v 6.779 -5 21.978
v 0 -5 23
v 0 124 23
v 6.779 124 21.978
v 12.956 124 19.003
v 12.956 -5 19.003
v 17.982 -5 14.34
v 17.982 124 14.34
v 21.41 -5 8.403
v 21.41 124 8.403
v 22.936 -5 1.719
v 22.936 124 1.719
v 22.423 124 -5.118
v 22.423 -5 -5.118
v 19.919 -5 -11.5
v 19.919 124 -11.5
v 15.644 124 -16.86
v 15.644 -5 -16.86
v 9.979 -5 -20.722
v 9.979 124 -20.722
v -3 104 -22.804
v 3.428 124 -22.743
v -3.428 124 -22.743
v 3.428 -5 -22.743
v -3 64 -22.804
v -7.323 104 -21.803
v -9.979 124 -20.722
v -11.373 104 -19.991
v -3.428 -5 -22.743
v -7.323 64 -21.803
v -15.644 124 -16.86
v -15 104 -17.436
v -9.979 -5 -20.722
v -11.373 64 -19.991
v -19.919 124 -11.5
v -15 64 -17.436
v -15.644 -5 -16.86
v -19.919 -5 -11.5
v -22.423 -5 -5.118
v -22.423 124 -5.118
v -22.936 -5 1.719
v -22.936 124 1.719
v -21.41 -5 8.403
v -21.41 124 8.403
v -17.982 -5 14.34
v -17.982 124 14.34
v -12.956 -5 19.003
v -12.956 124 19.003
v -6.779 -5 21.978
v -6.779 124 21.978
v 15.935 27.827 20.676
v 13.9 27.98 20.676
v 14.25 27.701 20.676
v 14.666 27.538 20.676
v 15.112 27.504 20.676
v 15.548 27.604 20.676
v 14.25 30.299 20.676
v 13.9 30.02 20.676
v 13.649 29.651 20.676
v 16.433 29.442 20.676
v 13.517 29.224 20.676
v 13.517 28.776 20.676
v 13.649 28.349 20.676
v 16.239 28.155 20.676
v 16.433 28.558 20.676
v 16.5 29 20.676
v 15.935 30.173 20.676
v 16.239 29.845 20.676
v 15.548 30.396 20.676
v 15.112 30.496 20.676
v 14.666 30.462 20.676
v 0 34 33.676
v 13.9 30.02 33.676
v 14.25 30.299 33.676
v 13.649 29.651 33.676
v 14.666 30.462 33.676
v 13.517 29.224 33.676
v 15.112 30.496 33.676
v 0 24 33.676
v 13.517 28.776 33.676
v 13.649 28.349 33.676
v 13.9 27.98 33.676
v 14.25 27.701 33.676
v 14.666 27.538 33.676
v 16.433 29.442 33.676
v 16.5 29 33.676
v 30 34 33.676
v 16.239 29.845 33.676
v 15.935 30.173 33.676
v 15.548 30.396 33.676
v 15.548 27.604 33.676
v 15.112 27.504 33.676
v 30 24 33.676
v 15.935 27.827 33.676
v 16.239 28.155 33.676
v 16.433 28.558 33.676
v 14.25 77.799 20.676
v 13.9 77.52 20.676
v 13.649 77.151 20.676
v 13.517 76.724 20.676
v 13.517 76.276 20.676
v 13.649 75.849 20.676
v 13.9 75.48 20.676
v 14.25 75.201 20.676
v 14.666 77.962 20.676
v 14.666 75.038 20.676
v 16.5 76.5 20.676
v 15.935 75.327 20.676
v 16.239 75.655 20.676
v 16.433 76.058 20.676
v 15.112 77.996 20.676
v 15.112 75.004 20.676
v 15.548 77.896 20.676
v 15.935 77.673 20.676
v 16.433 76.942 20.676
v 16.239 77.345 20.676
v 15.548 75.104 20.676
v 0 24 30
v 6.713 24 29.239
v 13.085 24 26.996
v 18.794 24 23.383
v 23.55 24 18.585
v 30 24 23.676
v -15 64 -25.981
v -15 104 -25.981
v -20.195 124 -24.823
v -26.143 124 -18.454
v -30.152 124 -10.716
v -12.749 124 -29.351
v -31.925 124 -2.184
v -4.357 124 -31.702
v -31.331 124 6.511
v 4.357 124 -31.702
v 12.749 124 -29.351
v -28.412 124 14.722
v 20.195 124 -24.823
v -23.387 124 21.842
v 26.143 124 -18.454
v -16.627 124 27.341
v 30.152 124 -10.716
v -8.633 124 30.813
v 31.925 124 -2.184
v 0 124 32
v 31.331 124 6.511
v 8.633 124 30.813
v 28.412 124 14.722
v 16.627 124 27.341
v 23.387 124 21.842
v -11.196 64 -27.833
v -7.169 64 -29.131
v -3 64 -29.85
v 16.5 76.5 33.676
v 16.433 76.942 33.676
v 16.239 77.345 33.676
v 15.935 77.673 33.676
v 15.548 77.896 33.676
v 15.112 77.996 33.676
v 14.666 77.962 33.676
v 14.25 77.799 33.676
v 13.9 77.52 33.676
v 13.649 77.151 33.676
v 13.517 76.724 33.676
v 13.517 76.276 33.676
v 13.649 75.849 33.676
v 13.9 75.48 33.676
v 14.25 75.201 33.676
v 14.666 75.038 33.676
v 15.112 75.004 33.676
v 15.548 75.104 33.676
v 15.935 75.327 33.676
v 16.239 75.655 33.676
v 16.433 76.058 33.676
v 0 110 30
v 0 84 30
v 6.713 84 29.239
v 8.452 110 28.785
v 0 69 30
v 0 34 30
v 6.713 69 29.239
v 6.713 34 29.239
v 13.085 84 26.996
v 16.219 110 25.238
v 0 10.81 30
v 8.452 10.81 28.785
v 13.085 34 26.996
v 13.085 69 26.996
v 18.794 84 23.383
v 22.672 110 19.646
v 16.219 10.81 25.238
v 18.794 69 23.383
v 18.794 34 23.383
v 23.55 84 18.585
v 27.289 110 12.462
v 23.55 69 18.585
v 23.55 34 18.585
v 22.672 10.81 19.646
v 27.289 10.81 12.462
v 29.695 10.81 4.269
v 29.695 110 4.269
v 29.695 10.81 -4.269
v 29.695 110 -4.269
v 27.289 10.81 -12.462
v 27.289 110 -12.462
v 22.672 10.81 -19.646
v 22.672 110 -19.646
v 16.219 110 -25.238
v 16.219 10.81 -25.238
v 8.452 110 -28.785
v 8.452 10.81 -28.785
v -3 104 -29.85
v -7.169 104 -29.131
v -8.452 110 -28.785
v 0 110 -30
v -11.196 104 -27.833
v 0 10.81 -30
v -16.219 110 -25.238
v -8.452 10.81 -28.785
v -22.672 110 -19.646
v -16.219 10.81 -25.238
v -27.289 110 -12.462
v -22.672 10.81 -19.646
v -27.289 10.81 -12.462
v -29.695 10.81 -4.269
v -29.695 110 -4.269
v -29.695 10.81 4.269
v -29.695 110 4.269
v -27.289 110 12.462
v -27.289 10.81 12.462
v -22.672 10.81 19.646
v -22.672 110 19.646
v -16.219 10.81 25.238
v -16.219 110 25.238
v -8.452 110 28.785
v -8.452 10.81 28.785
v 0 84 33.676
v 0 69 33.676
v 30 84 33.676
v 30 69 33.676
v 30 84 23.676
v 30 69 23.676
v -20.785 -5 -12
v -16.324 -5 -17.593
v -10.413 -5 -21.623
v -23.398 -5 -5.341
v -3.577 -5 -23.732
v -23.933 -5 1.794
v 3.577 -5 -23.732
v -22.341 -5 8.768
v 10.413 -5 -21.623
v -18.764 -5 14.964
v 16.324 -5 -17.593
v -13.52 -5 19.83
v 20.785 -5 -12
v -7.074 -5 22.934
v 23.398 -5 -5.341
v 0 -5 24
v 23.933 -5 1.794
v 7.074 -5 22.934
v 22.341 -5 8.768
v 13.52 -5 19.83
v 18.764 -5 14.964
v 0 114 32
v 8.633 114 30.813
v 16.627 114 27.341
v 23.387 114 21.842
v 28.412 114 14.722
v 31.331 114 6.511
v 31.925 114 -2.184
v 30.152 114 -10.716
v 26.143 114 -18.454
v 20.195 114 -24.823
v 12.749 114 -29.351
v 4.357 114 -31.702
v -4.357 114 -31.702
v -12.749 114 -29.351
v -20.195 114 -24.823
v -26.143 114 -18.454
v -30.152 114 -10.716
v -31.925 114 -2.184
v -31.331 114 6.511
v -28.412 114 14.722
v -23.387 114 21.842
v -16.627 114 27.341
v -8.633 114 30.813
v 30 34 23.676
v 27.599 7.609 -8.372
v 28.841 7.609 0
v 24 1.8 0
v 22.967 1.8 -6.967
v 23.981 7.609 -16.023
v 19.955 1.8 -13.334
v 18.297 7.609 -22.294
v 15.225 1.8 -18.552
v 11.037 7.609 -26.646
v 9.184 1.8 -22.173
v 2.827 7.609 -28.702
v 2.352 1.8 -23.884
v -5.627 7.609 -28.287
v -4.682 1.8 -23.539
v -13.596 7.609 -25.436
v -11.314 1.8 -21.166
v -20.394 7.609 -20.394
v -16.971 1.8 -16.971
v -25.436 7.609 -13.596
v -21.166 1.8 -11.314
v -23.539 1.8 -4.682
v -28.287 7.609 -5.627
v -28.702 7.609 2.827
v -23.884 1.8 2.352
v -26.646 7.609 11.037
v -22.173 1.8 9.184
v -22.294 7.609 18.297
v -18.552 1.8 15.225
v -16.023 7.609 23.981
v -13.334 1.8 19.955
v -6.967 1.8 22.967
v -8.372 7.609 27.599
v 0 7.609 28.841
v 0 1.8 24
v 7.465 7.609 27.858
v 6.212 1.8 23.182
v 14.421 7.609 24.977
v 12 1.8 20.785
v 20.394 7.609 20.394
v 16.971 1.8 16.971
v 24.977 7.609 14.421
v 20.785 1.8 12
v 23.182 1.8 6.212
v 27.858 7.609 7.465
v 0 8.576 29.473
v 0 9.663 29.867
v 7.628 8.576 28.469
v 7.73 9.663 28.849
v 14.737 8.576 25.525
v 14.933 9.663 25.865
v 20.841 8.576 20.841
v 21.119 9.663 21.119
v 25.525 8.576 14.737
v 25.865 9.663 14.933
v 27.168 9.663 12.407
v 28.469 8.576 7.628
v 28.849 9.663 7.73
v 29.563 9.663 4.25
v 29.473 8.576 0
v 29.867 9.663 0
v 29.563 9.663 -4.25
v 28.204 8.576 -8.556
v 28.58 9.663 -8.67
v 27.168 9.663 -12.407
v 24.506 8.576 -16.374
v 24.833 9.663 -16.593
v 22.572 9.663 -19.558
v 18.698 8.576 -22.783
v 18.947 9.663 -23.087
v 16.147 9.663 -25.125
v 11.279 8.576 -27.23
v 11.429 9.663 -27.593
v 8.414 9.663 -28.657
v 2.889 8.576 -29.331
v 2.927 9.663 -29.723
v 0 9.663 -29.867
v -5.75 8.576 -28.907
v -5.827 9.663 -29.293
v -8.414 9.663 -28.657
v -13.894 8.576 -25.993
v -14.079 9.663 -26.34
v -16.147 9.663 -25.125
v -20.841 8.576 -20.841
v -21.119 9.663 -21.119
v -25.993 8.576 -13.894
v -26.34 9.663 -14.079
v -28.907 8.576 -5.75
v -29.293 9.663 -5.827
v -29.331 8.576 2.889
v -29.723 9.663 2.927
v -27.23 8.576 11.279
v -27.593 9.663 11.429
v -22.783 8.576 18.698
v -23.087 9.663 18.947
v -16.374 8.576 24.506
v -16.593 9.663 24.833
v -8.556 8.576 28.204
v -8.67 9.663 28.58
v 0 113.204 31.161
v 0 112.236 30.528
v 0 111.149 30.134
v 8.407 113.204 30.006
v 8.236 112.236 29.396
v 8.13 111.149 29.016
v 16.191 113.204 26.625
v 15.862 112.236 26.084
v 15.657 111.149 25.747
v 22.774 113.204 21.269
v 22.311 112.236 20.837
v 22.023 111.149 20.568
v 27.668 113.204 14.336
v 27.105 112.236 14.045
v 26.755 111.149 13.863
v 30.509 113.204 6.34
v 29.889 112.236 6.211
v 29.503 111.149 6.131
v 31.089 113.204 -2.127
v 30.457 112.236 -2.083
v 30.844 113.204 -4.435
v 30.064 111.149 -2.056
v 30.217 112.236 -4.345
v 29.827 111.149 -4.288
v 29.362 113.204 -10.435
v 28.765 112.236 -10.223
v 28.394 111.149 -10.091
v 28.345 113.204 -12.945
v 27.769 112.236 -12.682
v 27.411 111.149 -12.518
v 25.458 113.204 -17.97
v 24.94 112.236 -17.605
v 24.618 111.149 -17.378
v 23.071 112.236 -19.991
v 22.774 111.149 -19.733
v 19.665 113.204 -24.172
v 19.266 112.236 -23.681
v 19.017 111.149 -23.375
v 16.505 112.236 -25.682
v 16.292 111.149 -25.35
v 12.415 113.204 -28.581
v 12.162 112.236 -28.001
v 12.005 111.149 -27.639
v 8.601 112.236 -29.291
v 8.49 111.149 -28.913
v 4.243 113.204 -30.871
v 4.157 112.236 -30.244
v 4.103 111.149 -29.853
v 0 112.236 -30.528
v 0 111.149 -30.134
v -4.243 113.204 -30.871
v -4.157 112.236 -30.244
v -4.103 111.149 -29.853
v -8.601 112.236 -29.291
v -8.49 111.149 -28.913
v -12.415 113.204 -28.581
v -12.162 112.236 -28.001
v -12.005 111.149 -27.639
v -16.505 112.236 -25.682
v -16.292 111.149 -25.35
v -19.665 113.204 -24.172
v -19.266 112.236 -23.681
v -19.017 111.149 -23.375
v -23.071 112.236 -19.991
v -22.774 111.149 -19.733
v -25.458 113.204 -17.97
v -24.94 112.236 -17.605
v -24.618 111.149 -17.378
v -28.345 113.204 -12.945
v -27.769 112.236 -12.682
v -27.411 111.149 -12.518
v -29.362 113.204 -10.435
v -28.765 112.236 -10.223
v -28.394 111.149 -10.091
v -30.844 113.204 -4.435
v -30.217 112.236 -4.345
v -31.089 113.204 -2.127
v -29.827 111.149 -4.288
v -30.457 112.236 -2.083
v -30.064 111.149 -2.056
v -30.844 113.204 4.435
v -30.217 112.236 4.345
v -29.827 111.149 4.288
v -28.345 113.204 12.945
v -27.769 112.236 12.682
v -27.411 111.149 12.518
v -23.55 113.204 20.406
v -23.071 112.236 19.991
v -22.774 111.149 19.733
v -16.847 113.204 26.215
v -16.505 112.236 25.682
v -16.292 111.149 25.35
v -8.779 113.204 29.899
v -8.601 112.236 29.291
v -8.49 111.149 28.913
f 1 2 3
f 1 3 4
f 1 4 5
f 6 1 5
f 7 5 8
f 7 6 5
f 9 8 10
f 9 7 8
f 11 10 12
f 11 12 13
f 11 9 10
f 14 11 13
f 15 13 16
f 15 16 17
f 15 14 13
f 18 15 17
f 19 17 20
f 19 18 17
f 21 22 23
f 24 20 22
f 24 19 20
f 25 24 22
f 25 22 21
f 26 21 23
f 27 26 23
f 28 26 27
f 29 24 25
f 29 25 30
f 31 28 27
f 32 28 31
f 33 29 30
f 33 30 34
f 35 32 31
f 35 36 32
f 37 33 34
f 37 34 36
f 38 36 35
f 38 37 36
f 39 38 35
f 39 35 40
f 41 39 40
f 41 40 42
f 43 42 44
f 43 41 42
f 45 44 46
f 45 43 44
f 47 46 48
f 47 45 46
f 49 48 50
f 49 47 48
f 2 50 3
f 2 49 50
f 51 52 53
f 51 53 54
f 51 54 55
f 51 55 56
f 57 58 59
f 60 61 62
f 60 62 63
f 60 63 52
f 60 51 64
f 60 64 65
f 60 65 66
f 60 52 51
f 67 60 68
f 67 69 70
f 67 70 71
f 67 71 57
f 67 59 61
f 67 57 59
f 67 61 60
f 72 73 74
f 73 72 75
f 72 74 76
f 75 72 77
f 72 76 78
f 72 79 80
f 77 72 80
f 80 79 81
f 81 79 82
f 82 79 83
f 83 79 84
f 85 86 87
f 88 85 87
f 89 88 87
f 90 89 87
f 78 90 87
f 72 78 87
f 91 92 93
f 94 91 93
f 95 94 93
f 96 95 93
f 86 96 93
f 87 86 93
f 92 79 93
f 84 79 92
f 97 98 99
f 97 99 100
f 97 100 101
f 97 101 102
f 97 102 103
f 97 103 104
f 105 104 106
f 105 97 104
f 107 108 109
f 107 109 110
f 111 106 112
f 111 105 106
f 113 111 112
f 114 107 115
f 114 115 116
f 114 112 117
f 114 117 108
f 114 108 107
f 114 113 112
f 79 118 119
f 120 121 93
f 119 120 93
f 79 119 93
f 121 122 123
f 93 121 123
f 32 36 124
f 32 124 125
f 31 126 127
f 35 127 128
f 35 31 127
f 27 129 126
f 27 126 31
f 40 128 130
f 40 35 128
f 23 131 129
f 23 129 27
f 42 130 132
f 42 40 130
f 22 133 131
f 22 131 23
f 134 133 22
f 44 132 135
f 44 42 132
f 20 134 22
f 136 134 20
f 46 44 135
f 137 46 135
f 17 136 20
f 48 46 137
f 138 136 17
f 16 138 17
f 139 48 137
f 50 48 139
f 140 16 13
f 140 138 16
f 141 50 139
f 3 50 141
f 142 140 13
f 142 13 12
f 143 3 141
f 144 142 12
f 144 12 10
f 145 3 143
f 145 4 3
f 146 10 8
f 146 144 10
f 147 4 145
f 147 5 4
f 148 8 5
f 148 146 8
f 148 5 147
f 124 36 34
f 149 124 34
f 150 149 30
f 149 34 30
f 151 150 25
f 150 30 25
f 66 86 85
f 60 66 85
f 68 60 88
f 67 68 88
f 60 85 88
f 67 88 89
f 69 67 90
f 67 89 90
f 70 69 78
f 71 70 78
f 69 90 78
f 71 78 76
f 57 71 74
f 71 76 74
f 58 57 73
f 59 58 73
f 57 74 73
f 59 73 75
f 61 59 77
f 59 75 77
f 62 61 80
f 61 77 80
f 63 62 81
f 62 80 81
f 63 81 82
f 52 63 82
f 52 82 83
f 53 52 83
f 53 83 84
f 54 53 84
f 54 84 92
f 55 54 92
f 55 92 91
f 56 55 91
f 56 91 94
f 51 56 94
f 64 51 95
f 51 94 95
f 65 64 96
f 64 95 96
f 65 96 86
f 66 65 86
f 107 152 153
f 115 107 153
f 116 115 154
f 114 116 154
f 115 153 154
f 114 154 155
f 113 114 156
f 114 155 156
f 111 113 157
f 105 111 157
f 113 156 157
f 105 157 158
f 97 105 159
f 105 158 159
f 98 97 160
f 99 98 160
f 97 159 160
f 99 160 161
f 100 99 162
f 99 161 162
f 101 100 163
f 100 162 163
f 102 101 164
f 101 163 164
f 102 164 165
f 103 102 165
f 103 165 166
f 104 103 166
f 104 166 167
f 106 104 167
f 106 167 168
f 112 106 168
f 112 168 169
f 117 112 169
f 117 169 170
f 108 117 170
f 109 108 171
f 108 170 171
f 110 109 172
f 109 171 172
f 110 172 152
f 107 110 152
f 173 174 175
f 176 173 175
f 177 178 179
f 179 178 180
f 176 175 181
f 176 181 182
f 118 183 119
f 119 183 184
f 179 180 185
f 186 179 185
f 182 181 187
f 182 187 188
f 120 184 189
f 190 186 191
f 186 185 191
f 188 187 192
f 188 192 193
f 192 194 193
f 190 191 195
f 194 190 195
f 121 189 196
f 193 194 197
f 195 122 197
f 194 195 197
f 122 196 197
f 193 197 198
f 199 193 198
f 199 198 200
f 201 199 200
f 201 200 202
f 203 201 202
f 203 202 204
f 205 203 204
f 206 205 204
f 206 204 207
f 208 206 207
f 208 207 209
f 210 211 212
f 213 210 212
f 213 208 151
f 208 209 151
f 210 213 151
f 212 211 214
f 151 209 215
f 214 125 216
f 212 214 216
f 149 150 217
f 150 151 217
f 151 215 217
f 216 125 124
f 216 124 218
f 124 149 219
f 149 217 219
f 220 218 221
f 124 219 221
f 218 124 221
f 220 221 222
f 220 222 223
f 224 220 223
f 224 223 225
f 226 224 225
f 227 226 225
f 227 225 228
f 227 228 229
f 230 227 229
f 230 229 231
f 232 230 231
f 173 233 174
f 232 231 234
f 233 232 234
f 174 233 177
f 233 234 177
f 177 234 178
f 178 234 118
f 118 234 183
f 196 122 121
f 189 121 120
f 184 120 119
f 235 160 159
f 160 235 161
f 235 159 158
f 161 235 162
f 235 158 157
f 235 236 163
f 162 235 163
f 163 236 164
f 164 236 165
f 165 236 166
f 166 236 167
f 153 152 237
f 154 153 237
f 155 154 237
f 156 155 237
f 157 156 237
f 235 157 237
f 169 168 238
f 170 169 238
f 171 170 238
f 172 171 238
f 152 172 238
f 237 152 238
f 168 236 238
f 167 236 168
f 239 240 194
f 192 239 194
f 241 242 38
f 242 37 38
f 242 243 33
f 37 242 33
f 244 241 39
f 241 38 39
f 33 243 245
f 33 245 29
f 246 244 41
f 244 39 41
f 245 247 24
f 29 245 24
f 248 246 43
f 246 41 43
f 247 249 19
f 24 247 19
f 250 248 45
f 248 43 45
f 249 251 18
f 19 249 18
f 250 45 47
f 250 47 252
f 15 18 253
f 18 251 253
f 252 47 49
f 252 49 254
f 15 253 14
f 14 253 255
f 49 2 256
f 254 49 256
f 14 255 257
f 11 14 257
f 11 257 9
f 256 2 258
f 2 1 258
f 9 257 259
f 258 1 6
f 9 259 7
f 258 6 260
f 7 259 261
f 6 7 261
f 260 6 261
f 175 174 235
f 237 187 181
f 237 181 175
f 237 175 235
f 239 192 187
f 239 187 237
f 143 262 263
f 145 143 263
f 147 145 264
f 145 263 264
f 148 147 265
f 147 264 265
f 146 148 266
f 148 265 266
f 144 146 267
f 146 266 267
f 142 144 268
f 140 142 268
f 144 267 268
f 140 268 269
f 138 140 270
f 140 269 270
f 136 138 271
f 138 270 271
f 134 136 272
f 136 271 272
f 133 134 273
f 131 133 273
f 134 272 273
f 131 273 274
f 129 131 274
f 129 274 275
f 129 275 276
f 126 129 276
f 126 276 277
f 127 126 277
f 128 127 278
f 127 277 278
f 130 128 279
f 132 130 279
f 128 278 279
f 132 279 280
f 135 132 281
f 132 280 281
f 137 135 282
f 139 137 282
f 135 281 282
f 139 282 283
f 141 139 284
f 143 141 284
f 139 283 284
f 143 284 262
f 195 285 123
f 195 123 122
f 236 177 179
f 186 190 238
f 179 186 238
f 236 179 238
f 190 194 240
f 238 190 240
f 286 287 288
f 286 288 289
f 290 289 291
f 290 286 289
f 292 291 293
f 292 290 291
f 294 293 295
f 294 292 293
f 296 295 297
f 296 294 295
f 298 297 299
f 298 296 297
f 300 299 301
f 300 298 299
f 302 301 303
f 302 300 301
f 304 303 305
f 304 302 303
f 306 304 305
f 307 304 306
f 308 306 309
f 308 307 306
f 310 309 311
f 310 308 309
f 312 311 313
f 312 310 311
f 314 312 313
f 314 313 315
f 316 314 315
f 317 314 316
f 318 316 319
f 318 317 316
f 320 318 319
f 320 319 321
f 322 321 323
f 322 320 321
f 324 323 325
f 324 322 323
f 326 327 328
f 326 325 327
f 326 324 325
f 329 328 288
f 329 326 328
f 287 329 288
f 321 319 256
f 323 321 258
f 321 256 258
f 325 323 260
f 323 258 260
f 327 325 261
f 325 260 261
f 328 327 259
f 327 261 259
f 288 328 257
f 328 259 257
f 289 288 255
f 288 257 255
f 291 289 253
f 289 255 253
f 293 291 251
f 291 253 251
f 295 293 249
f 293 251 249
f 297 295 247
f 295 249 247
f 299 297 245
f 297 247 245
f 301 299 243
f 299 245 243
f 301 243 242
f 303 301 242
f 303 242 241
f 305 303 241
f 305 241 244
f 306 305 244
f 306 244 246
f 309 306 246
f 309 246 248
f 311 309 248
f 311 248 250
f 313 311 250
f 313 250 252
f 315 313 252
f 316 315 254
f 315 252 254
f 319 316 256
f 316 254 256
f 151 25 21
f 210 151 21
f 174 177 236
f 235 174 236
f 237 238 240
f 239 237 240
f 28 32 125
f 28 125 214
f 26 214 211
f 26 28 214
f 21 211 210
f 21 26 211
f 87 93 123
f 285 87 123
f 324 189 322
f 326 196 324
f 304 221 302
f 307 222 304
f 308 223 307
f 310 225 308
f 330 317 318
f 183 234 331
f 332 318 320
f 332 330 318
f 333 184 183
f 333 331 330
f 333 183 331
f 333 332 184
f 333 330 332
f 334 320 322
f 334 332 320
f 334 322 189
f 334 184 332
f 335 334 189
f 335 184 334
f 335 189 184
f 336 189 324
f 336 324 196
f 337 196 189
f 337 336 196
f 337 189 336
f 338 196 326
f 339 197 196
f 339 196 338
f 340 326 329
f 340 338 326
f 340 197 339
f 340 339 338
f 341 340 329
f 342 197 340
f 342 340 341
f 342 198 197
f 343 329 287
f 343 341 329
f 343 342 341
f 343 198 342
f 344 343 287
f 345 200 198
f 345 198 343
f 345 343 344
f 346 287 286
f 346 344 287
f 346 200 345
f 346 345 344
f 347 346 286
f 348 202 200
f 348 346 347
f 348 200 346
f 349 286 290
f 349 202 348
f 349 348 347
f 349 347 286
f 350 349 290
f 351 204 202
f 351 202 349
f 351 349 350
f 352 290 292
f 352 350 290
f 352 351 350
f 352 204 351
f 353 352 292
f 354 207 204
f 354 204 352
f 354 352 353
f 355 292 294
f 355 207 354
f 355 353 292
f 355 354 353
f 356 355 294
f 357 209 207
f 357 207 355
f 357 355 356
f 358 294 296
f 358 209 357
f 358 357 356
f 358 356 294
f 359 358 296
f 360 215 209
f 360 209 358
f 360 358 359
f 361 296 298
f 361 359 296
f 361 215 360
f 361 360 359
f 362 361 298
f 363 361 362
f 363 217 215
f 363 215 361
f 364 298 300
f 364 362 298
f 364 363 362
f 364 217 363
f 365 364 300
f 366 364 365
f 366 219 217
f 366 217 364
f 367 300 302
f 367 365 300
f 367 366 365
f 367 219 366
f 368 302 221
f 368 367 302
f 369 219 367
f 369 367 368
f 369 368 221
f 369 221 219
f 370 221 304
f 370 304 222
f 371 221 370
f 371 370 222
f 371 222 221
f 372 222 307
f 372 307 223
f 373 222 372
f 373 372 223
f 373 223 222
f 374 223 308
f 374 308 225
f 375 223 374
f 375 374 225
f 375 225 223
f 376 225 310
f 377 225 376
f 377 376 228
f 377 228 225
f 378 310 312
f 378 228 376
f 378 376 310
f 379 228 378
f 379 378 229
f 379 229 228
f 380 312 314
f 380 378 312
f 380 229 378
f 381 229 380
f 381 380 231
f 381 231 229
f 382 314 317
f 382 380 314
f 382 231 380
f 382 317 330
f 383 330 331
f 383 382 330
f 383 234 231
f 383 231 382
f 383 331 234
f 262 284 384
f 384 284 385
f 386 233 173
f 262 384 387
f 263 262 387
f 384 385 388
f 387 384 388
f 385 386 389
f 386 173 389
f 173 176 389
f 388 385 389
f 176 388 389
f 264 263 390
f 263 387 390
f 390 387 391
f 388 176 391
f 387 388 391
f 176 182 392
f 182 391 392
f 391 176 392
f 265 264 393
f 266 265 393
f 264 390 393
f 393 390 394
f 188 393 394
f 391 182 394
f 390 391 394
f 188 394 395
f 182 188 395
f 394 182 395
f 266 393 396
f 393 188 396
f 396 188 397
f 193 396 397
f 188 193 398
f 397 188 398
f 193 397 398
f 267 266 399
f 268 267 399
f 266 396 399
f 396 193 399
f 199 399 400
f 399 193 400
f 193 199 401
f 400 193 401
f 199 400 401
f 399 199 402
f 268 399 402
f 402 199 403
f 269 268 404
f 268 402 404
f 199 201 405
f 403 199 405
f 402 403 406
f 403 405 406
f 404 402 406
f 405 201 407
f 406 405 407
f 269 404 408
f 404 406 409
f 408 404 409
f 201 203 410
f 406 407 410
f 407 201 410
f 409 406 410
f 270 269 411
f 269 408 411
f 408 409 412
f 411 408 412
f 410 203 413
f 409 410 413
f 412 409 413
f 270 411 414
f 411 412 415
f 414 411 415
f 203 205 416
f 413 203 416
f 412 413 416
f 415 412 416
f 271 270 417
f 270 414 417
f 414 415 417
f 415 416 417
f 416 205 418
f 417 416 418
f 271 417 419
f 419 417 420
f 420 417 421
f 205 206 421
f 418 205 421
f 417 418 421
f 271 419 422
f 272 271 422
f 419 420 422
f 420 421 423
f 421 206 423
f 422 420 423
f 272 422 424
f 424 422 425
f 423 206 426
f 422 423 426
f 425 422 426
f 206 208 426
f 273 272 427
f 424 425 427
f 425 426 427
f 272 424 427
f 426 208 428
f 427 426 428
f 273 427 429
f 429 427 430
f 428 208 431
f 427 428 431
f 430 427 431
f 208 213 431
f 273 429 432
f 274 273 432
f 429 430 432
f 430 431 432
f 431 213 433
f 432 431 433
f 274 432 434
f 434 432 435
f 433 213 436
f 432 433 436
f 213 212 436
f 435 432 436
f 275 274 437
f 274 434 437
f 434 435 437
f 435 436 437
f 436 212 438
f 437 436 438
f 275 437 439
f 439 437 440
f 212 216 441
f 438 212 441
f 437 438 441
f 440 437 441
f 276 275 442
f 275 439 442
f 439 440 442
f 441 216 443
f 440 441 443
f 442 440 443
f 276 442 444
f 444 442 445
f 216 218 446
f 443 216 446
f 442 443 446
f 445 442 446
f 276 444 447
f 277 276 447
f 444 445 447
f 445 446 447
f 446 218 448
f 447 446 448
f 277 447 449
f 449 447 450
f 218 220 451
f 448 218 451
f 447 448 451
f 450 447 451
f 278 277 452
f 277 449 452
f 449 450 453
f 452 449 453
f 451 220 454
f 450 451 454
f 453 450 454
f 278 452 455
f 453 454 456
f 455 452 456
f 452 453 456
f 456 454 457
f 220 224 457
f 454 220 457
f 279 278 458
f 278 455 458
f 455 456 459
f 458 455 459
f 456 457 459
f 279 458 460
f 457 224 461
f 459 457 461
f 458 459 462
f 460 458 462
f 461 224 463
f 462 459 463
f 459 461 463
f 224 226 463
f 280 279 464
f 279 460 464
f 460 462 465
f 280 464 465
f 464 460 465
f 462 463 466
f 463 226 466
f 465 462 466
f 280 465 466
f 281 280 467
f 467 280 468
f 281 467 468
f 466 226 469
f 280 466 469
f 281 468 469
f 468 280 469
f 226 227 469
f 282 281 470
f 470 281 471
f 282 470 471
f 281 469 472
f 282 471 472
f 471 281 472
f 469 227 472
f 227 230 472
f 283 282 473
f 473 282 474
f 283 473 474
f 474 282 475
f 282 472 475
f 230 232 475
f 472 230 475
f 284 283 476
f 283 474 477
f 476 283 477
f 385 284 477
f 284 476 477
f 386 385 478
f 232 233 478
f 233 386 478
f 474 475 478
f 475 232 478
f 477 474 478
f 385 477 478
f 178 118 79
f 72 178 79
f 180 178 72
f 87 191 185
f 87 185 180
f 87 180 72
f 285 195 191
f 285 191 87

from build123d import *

# Parameters (mm, degrees)
CROQUIS1_R                   = 22.5
CROQUIS2_R                   = 30
CROQUIS3_R                   = 30
SALIENTE_EXTRUIR1_DEPTH      = 105
CROQUIS4_R                   = 32
SALIENTE_EXTRUIR2_DEPTH      = 10
CROQUIS6_R                   = 23
CORTAR_EXTRUIR1_DEPTH        = 161
SALIENTE_EXTRUIR3_DEPTH      = 3
SALIENTE_EXTRUIR3_DEPTH_BACK = 5
CROQUIS7_R                   = 24
CROQUIS7_R_2                 = 23
REDONDEO1_R                  = 5
CROQUIS9_W                   = 12
CROQUIS9_H                   = 40
CORTAR_EXTRUIR2_DEPTH        = 525
SALIENTE_EXTRUIR4_START      = -15
SALIENTE_EXTRUIR4_DEPTH      = 15
SALIENTE_EXTRUIR5_DEPTH      = 10
CROQUIS12_R                  = 1.5
CORTAR_EXTRUIR3_DEPTH        = 13


with BuildPart() as part:
    # Croquis1 → Recubrir1 section 0
    with BuildSketch(Plane(origin=(0, 0, 0), x_dir=(1, 0, 0), z_dir=(0, 1, 0))):
        Circle(CROQUIS1_R)
    # Croquis2 → Recubrir1 section 1
    with BuildSketch(Plane(origin=(0, 9, 0), x_dir=(1, 0, 0), z_dir=(0, 1, 0))):
        Circle(CROQUIS2_R)
    loft()

    # Croquis3 → Saliente-Extruir1 (add)
    with BuildSketch(Plane(origin=(0, 9, 0), x_dir=(1, 0, 0), z_dir=(0, 1, 0))):
        with Locations(Location((0, 0, 0), (0, 0, 270))):
            Circle(CROQUIS3_R)
    extrude(amount=SALIENTE_EXTRUIR1_DEPTH)

    # Croquis4 → Saliente-Extruir2 (add)
    with BuildSketch(Plane(origin=(0, 114, 0), x_dir=(1, 0, 0), z_dir=(0, 1, 0))):
        with Locations(Location((0, 0, 0), (0, 0, 270))):
            Circle(CROQUIS4_R)
    extrude(amount=SALIENTE_EXTRUIR2_DEPTH)

    # Croquis6 → Cortar-Extruir1 (cut)
    with BuildSketch(Plane(origin=(0, 124, 0), x_dir=(1, 0, 0), z_dir=(0, 1, 0))):
        with Locations(Location((0, 0, 0), (0, 0, 270))):
            Circle(CROQUIS6_R)
    extrude(amount=-CORTAR_EXTRUIR1_DEPTH, mode=Mode.SUBTRACT)

    # Croquis7 → Saliente-Extruir3 (add, two sides: drawn at the far end of the back side and taken through both)
    with BuildSketch(Plane(origin=(0, 0, 0), x_dir=(1, 0, 0), z_dir=(0, 1, 0)).offset(-SALIENTE_EXTRUIR3_DEPTH_BACK)):
        with Locations(Location((0, 0, 0), (0, 0, 270))):
            Circle(CROQUIS7_R)
        with Locations(Location((0, 0, 0), (0, 0, 270))):
            Circle(CROQUIS7_R_2, mode=Mode.SUBTRACT)
    extrude(amount=SALIENTE_EXTRUIR3_DEPTH + SALIENTE_EXTRUIR3_DEPTH_BACK)

    # Redondeo1
    # the kernel refuses this fillet: 5 mm, written as the material it adds along each edge
    with BuildSketch(Plane(origin=(0, 114, 0), x_dir=(0, 0, 1), z_dir=(-1, 0, 0))) as redondeo1_piece_1:
        with BuildLine():
            CenterArc((35, -4), REDONDEO1_R, 126.869897646, 53.130102354)
            Line((32, 0), (30, 0))
            Line((30, 0), (30, -4))
        make_face()
    redondeo1_piece_1_solid = revolve(axis=Axis((0, 114, 0), (0, 1, 0)), mode=Mode.PRIVATE)
    add([redondeo1_piece_1_solid])
    # the kernel refuses this fillet: 5 mm, written as the material it takes off along each edge
    with BuildSketch(Plane(origin=(0, 9, 0), x_dir=(1, 0, 0), z_dir=(0, 0, 1))) as redondeo1_2_piece_1:
        with BuildLine():
            CenterArc((30 - REDONDEO1_R, REDONDEO1_R * 0.362049935181), REDONDEO1_R, 320.194428908, 39.805571092)
            Line((30, REDONDEO1_R * 0.362049935181), (30, 0))
            Line((30, 0), (30 - REDONDEO1_R * 0.231778720403, -REDONDEO1_R * 0.278134464483))
        make_face()
    redondeo1_2_piece_1_solid = revolve(axis=Axis((0, 9, 0), (0, 1, 0)), revolution_arc=270, mode=Mode.PRIVATE)
    with BuildSketch(Plane(origin=(0, 9, 0), x_dir=(0, 0, 1), z_dir=(-1, 0, 0))) as redondeo1_2_piece_2:
        with BuildLine():
            CenterArc((30 - REDONDEO1_R, REDONDEO1_R * 0.362049935181), REDONDEO1_R, 320.194428908, 39.805571092)
            Line((30, REDONDEO1_R * 0.362049935181), (30, 0))
            Line((30, 0), (30 - REDONDEO1_R * 0.231778720403, -REDONDEO1_R * 0.278134464483))
        make_face()
    redondeo1_2_piece_2_solid = revolve(axis=Axis((0, 9, 0), (0, 1, 0)), revolution_arc=90, mode=Mode.PRIVATE)
    add([redondeo1_2_piece_1_solid, redondeo1_2_piece_2_solid], mode=Mode.SUBTRACT)

    # Croquis9 → Cortar-Extruir2 (cut)
    with BuildSketch(Plane.XY):
        with Locations((-9, 84)):
            Rectangle(CROQUIS9_W, CROQUIS9_H)
    extrude(amount=-CORTAR_EXTRUIR2_DEPTH, mode=Mode.SUBTRACT)

    # Croquis10 → Saliente-Extruir4 (add)
    with BuildSketch(Plane(origin=(0, 84, 0), x_dir=(1, 0, 0), z_dir=(0, 1, 0)).offset(SALIENTE_EXTRUIR4_START)):
        with BuildLine():
            Line((0, -30), (0, -33.675648379))
            Line((0, -33.675648379), (30, -33.675648379))
            Line((30, -33.675648379), (30, -23.675648379))
            Line((30, -23.675648379), (23.549751452, -18.585187827))
            ThreePointArc((23.549751452, -18.585187827), (13.085189437, -26.995885194), (0, -30))
        make_face()
    extrude(amount=SALIENTE_EXTRUIR4_DEPTH)

    # Croquis11 → Saliente-Extruir5 (add)
    with BuildSketch(Plane(origin=(0, 24, 0), x_dir=(1, 0, 0), z_dir=(0, 1, 0))):
        with BuildLine():
            Line((30, -23.675648379), (23.549751452, -18.585187827))
            ThreePointArc((23.549751452, -18.585187827), (13.085189437, -26.995885194), (0, -30))
            Line((0, -30), (0, -33.675648379))
            Line((0, -33.675648379), (30, -33.675648379))
            Line((30, -33.675648379), (30, -23.675648379))
        make_face()
    extrude(amount=SALIENTE_EXTRUIR5_DEPTH)

    # Croquis12 → Cortar-Extruir3 (cut)
    with BuildSketch(Plane.XY.offset(33.675648379)):
        with Locations((15, 29)):
            Circle(CROQUIS12_R)
        with Locations((15, 76.5)):
            Circle(CROQUIS12_R)
    extrude(amount=-CORTAR_EXTRUIR3_DEPTH, mode=Mode.SUBTRACT)


solid = part.part
